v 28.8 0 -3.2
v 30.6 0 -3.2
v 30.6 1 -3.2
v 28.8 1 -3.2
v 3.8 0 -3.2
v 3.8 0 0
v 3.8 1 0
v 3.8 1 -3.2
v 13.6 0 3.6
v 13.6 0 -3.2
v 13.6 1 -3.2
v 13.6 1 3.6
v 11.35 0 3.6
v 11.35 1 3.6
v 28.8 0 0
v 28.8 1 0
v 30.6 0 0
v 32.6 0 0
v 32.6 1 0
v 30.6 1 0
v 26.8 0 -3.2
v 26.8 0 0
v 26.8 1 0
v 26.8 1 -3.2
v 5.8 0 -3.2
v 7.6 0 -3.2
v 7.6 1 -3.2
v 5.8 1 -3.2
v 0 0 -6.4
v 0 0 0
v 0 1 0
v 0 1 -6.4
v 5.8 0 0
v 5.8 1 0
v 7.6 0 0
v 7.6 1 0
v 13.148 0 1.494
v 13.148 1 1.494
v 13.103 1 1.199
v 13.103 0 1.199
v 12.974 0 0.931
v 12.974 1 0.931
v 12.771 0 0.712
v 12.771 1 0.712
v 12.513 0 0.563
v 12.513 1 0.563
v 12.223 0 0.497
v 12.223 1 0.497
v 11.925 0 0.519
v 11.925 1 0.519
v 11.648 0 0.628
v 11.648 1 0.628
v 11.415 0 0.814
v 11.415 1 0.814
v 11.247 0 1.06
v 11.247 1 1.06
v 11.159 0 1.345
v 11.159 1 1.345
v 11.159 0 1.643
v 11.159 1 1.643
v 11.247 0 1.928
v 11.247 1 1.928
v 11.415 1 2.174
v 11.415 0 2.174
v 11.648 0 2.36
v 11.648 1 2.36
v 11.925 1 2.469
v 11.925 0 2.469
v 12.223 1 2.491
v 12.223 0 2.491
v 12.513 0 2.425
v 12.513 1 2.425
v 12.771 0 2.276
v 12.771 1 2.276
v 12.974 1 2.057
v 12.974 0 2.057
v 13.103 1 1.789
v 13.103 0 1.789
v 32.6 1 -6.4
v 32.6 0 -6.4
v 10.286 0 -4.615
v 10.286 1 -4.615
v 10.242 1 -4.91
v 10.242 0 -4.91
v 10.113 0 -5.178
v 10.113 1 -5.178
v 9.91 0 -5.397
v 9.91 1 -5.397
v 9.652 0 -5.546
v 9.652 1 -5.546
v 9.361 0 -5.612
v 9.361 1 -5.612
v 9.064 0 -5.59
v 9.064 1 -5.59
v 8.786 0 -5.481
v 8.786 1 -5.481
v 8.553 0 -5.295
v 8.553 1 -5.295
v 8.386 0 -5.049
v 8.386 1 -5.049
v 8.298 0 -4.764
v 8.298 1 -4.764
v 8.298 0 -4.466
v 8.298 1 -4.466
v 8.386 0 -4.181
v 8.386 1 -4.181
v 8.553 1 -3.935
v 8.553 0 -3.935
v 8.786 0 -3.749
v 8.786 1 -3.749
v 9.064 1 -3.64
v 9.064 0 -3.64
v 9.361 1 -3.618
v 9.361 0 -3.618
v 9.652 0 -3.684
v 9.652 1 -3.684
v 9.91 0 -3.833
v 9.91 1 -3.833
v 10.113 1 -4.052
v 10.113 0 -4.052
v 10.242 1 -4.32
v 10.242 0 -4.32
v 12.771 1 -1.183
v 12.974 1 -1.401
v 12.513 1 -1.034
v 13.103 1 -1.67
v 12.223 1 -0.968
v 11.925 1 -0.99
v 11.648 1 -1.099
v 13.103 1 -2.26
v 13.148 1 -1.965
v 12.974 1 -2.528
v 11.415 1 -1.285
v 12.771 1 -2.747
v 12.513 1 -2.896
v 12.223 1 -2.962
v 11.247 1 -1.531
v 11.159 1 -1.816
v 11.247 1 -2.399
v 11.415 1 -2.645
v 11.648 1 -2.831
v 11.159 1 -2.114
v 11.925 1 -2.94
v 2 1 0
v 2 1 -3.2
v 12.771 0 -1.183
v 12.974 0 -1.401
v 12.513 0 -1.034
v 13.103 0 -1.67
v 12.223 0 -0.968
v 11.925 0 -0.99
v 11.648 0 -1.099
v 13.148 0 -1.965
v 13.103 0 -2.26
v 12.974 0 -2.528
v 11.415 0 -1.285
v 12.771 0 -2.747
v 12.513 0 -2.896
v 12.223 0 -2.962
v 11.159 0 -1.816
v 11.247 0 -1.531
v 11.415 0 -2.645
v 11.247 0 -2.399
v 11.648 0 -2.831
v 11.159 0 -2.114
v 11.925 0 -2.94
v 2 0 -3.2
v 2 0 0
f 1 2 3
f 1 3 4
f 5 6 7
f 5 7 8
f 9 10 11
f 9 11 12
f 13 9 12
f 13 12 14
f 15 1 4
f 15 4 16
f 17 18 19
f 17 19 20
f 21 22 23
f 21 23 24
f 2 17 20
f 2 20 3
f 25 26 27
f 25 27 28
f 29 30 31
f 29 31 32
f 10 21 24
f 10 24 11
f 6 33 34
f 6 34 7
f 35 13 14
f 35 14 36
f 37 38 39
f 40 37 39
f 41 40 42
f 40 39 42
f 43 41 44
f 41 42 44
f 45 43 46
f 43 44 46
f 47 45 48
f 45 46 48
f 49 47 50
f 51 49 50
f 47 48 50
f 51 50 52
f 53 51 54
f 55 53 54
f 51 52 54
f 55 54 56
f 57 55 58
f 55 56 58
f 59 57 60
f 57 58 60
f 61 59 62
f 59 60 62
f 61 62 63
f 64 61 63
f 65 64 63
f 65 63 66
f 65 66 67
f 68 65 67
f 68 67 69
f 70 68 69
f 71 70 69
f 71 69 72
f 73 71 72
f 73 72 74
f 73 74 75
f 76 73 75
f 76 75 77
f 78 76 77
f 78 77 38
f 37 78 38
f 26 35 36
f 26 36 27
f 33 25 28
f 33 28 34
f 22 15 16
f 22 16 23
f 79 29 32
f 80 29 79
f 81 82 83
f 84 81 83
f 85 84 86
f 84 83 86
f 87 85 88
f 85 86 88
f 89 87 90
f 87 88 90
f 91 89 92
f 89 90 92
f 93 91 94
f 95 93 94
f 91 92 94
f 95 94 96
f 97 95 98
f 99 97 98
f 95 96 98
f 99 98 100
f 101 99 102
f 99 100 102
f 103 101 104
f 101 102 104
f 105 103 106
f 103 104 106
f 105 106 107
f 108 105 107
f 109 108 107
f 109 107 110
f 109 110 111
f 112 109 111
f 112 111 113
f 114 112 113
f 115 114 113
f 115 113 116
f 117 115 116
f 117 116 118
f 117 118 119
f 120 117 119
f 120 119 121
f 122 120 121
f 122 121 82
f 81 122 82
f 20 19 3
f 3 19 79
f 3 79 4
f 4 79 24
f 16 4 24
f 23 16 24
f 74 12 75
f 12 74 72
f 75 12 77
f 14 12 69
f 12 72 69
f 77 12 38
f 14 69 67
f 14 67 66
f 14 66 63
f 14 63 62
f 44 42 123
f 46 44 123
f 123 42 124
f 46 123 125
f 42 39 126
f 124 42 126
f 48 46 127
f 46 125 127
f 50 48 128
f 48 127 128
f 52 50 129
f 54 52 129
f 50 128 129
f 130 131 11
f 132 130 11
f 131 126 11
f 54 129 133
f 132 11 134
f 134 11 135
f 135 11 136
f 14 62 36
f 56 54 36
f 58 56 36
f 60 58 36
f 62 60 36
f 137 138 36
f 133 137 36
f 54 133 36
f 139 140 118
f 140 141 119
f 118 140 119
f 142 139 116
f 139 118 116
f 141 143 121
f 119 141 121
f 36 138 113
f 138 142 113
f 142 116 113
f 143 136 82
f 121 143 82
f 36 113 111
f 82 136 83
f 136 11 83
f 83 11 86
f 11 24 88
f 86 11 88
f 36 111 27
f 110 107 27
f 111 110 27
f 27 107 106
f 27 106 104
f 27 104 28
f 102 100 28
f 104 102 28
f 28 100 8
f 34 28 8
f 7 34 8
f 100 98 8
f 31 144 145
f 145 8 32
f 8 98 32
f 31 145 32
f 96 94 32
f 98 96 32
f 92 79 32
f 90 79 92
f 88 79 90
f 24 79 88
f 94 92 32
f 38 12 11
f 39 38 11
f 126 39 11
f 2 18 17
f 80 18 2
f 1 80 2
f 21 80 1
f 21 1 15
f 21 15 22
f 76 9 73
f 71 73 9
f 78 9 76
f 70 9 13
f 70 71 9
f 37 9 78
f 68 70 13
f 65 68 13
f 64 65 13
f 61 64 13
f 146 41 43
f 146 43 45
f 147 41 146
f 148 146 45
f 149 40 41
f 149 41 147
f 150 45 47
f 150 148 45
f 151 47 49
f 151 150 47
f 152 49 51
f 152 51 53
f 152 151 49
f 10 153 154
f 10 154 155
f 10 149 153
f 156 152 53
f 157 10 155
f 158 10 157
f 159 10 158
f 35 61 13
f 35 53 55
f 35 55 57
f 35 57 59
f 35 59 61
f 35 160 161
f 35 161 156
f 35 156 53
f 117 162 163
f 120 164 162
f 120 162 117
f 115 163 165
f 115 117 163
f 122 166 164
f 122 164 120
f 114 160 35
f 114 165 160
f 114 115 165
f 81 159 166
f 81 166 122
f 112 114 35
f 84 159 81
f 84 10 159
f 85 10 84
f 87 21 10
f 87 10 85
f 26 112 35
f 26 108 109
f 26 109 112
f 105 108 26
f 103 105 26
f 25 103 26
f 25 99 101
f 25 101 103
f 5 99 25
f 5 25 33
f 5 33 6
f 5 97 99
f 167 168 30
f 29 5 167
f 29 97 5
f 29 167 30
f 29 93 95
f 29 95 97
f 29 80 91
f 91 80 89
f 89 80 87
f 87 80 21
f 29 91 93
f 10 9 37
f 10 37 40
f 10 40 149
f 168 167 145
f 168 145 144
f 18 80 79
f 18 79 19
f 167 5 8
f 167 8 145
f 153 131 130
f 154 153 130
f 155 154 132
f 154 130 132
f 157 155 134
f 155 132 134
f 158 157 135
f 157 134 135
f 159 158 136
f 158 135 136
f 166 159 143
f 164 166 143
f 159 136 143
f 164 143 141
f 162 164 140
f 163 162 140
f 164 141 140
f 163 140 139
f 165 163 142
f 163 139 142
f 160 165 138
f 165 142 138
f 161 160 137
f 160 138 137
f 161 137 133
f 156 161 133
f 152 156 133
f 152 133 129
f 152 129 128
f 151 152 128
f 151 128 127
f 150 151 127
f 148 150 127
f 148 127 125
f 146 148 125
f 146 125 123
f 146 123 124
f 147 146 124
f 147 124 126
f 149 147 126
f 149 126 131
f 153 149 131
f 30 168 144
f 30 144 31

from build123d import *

# Parameters (mm, degrees)
BOSS_EXTRUDE1_DEPTH = 1
CUT_EXTRUDE1_REACH  = 3
SKETCH2_R           = 1


with BuildPart() as part:
    # Sketch1 → Boss-Extrude1 (new body)
    with BuildSketch(Plane(origin=(0, 0, 0), x_dir=(1, 0, 0), z_dir=(0, 1, 0))):
        Polygon((0, 0), (0, 6.4), (32.6, 6.4), (32.6, 0), (30.6, 0), (30.6, 3.2), (28.8, 3.2), (28.8, 0), (26.8, 0), (26.8, 3.2), (13.6, 3.2), (13.6, -3.6), (11.35, -3.6), (7.6, 0), (7.6, 3.2), (5.8, 3.2), (5.8, 0), (3.8, 0), (3.8, 3.2), (2, 3.2), (2, 0), align=None)
    extrude(amount=BOSS_EXTRUDE1_DEPTH)

    # Sketch2 → Cut-Extrude1 (cut, up to next)
    with BuildSketch(Plane(origin=(0, 1, 0), x_dir=(1, 0, 0), z_dir=(0, 1, 0)), mode=Mode.PRIVATE) as cut_extrude1_sk1:
        with Locations((9.286488836, 4.615010183)):
            Circle(SKETCH2_R)
    cut_extrude1_tool1 = extrude(cut_extrude1_sk1.sketch, amount=-CUT_EXTRUDE1_REACH, mode=Mode.PRIVATE) & part.part
    add(cut_extrude1_tool1.solids().sort_by_distance((9.286489, 1, -4.61501))[0], mode=Mode.SUBTRACT)
    # Sketch2 → Cut-Extrude1 (cut, up to next)
    with BuildSketch(Plane(origin=(0, 1, 0), x_dir=(1, 0, 0), z_dir=(0, 1, 0)), mode=Mode.PRIVATE) as cut_extrude1_sk2:
        with Locations((12.147825288, 1.964747252)):
            Circle(SKETCH2_R)
    cut_extrude1_tool2 = extrude(cut_extrude1_sk2.sketch, amount=-CUT_EXTRUDE1_REACH, mode=Mode.PRIVATE) & part.part
    add(cut_extrude1_tool2.solids().sort_by_distance((12.147825, 1, -1.964747))[0], mode=Mode.SUBTRACT)
    # Sketch2 → Cut-Extrude1 (cut, up to next)
    with BuildSketch(Plane(origin=(0, 1, 0), x_dir=(1, 0, 0), z_dir=(0, 1, 0)), mode=Mode.PRIVATE) as cut_extrude1_sk3:
        with Locations((12.147825288, -1.494058873)):
            Circle(SKETCH2_R)
    cut_extrude1_tool3 = extrude(cut_extrude1_sk3.sketch, amount=-CUT_EXTRUDE1_REACH, mode=Mode.PRIVATE) & part.part
    add(cut_extrude1_tool3.solids().sort_by_distance((12.147825, 1, 1.494059))[0], mode=Mode.SUBTRACT)


solid = part.part
